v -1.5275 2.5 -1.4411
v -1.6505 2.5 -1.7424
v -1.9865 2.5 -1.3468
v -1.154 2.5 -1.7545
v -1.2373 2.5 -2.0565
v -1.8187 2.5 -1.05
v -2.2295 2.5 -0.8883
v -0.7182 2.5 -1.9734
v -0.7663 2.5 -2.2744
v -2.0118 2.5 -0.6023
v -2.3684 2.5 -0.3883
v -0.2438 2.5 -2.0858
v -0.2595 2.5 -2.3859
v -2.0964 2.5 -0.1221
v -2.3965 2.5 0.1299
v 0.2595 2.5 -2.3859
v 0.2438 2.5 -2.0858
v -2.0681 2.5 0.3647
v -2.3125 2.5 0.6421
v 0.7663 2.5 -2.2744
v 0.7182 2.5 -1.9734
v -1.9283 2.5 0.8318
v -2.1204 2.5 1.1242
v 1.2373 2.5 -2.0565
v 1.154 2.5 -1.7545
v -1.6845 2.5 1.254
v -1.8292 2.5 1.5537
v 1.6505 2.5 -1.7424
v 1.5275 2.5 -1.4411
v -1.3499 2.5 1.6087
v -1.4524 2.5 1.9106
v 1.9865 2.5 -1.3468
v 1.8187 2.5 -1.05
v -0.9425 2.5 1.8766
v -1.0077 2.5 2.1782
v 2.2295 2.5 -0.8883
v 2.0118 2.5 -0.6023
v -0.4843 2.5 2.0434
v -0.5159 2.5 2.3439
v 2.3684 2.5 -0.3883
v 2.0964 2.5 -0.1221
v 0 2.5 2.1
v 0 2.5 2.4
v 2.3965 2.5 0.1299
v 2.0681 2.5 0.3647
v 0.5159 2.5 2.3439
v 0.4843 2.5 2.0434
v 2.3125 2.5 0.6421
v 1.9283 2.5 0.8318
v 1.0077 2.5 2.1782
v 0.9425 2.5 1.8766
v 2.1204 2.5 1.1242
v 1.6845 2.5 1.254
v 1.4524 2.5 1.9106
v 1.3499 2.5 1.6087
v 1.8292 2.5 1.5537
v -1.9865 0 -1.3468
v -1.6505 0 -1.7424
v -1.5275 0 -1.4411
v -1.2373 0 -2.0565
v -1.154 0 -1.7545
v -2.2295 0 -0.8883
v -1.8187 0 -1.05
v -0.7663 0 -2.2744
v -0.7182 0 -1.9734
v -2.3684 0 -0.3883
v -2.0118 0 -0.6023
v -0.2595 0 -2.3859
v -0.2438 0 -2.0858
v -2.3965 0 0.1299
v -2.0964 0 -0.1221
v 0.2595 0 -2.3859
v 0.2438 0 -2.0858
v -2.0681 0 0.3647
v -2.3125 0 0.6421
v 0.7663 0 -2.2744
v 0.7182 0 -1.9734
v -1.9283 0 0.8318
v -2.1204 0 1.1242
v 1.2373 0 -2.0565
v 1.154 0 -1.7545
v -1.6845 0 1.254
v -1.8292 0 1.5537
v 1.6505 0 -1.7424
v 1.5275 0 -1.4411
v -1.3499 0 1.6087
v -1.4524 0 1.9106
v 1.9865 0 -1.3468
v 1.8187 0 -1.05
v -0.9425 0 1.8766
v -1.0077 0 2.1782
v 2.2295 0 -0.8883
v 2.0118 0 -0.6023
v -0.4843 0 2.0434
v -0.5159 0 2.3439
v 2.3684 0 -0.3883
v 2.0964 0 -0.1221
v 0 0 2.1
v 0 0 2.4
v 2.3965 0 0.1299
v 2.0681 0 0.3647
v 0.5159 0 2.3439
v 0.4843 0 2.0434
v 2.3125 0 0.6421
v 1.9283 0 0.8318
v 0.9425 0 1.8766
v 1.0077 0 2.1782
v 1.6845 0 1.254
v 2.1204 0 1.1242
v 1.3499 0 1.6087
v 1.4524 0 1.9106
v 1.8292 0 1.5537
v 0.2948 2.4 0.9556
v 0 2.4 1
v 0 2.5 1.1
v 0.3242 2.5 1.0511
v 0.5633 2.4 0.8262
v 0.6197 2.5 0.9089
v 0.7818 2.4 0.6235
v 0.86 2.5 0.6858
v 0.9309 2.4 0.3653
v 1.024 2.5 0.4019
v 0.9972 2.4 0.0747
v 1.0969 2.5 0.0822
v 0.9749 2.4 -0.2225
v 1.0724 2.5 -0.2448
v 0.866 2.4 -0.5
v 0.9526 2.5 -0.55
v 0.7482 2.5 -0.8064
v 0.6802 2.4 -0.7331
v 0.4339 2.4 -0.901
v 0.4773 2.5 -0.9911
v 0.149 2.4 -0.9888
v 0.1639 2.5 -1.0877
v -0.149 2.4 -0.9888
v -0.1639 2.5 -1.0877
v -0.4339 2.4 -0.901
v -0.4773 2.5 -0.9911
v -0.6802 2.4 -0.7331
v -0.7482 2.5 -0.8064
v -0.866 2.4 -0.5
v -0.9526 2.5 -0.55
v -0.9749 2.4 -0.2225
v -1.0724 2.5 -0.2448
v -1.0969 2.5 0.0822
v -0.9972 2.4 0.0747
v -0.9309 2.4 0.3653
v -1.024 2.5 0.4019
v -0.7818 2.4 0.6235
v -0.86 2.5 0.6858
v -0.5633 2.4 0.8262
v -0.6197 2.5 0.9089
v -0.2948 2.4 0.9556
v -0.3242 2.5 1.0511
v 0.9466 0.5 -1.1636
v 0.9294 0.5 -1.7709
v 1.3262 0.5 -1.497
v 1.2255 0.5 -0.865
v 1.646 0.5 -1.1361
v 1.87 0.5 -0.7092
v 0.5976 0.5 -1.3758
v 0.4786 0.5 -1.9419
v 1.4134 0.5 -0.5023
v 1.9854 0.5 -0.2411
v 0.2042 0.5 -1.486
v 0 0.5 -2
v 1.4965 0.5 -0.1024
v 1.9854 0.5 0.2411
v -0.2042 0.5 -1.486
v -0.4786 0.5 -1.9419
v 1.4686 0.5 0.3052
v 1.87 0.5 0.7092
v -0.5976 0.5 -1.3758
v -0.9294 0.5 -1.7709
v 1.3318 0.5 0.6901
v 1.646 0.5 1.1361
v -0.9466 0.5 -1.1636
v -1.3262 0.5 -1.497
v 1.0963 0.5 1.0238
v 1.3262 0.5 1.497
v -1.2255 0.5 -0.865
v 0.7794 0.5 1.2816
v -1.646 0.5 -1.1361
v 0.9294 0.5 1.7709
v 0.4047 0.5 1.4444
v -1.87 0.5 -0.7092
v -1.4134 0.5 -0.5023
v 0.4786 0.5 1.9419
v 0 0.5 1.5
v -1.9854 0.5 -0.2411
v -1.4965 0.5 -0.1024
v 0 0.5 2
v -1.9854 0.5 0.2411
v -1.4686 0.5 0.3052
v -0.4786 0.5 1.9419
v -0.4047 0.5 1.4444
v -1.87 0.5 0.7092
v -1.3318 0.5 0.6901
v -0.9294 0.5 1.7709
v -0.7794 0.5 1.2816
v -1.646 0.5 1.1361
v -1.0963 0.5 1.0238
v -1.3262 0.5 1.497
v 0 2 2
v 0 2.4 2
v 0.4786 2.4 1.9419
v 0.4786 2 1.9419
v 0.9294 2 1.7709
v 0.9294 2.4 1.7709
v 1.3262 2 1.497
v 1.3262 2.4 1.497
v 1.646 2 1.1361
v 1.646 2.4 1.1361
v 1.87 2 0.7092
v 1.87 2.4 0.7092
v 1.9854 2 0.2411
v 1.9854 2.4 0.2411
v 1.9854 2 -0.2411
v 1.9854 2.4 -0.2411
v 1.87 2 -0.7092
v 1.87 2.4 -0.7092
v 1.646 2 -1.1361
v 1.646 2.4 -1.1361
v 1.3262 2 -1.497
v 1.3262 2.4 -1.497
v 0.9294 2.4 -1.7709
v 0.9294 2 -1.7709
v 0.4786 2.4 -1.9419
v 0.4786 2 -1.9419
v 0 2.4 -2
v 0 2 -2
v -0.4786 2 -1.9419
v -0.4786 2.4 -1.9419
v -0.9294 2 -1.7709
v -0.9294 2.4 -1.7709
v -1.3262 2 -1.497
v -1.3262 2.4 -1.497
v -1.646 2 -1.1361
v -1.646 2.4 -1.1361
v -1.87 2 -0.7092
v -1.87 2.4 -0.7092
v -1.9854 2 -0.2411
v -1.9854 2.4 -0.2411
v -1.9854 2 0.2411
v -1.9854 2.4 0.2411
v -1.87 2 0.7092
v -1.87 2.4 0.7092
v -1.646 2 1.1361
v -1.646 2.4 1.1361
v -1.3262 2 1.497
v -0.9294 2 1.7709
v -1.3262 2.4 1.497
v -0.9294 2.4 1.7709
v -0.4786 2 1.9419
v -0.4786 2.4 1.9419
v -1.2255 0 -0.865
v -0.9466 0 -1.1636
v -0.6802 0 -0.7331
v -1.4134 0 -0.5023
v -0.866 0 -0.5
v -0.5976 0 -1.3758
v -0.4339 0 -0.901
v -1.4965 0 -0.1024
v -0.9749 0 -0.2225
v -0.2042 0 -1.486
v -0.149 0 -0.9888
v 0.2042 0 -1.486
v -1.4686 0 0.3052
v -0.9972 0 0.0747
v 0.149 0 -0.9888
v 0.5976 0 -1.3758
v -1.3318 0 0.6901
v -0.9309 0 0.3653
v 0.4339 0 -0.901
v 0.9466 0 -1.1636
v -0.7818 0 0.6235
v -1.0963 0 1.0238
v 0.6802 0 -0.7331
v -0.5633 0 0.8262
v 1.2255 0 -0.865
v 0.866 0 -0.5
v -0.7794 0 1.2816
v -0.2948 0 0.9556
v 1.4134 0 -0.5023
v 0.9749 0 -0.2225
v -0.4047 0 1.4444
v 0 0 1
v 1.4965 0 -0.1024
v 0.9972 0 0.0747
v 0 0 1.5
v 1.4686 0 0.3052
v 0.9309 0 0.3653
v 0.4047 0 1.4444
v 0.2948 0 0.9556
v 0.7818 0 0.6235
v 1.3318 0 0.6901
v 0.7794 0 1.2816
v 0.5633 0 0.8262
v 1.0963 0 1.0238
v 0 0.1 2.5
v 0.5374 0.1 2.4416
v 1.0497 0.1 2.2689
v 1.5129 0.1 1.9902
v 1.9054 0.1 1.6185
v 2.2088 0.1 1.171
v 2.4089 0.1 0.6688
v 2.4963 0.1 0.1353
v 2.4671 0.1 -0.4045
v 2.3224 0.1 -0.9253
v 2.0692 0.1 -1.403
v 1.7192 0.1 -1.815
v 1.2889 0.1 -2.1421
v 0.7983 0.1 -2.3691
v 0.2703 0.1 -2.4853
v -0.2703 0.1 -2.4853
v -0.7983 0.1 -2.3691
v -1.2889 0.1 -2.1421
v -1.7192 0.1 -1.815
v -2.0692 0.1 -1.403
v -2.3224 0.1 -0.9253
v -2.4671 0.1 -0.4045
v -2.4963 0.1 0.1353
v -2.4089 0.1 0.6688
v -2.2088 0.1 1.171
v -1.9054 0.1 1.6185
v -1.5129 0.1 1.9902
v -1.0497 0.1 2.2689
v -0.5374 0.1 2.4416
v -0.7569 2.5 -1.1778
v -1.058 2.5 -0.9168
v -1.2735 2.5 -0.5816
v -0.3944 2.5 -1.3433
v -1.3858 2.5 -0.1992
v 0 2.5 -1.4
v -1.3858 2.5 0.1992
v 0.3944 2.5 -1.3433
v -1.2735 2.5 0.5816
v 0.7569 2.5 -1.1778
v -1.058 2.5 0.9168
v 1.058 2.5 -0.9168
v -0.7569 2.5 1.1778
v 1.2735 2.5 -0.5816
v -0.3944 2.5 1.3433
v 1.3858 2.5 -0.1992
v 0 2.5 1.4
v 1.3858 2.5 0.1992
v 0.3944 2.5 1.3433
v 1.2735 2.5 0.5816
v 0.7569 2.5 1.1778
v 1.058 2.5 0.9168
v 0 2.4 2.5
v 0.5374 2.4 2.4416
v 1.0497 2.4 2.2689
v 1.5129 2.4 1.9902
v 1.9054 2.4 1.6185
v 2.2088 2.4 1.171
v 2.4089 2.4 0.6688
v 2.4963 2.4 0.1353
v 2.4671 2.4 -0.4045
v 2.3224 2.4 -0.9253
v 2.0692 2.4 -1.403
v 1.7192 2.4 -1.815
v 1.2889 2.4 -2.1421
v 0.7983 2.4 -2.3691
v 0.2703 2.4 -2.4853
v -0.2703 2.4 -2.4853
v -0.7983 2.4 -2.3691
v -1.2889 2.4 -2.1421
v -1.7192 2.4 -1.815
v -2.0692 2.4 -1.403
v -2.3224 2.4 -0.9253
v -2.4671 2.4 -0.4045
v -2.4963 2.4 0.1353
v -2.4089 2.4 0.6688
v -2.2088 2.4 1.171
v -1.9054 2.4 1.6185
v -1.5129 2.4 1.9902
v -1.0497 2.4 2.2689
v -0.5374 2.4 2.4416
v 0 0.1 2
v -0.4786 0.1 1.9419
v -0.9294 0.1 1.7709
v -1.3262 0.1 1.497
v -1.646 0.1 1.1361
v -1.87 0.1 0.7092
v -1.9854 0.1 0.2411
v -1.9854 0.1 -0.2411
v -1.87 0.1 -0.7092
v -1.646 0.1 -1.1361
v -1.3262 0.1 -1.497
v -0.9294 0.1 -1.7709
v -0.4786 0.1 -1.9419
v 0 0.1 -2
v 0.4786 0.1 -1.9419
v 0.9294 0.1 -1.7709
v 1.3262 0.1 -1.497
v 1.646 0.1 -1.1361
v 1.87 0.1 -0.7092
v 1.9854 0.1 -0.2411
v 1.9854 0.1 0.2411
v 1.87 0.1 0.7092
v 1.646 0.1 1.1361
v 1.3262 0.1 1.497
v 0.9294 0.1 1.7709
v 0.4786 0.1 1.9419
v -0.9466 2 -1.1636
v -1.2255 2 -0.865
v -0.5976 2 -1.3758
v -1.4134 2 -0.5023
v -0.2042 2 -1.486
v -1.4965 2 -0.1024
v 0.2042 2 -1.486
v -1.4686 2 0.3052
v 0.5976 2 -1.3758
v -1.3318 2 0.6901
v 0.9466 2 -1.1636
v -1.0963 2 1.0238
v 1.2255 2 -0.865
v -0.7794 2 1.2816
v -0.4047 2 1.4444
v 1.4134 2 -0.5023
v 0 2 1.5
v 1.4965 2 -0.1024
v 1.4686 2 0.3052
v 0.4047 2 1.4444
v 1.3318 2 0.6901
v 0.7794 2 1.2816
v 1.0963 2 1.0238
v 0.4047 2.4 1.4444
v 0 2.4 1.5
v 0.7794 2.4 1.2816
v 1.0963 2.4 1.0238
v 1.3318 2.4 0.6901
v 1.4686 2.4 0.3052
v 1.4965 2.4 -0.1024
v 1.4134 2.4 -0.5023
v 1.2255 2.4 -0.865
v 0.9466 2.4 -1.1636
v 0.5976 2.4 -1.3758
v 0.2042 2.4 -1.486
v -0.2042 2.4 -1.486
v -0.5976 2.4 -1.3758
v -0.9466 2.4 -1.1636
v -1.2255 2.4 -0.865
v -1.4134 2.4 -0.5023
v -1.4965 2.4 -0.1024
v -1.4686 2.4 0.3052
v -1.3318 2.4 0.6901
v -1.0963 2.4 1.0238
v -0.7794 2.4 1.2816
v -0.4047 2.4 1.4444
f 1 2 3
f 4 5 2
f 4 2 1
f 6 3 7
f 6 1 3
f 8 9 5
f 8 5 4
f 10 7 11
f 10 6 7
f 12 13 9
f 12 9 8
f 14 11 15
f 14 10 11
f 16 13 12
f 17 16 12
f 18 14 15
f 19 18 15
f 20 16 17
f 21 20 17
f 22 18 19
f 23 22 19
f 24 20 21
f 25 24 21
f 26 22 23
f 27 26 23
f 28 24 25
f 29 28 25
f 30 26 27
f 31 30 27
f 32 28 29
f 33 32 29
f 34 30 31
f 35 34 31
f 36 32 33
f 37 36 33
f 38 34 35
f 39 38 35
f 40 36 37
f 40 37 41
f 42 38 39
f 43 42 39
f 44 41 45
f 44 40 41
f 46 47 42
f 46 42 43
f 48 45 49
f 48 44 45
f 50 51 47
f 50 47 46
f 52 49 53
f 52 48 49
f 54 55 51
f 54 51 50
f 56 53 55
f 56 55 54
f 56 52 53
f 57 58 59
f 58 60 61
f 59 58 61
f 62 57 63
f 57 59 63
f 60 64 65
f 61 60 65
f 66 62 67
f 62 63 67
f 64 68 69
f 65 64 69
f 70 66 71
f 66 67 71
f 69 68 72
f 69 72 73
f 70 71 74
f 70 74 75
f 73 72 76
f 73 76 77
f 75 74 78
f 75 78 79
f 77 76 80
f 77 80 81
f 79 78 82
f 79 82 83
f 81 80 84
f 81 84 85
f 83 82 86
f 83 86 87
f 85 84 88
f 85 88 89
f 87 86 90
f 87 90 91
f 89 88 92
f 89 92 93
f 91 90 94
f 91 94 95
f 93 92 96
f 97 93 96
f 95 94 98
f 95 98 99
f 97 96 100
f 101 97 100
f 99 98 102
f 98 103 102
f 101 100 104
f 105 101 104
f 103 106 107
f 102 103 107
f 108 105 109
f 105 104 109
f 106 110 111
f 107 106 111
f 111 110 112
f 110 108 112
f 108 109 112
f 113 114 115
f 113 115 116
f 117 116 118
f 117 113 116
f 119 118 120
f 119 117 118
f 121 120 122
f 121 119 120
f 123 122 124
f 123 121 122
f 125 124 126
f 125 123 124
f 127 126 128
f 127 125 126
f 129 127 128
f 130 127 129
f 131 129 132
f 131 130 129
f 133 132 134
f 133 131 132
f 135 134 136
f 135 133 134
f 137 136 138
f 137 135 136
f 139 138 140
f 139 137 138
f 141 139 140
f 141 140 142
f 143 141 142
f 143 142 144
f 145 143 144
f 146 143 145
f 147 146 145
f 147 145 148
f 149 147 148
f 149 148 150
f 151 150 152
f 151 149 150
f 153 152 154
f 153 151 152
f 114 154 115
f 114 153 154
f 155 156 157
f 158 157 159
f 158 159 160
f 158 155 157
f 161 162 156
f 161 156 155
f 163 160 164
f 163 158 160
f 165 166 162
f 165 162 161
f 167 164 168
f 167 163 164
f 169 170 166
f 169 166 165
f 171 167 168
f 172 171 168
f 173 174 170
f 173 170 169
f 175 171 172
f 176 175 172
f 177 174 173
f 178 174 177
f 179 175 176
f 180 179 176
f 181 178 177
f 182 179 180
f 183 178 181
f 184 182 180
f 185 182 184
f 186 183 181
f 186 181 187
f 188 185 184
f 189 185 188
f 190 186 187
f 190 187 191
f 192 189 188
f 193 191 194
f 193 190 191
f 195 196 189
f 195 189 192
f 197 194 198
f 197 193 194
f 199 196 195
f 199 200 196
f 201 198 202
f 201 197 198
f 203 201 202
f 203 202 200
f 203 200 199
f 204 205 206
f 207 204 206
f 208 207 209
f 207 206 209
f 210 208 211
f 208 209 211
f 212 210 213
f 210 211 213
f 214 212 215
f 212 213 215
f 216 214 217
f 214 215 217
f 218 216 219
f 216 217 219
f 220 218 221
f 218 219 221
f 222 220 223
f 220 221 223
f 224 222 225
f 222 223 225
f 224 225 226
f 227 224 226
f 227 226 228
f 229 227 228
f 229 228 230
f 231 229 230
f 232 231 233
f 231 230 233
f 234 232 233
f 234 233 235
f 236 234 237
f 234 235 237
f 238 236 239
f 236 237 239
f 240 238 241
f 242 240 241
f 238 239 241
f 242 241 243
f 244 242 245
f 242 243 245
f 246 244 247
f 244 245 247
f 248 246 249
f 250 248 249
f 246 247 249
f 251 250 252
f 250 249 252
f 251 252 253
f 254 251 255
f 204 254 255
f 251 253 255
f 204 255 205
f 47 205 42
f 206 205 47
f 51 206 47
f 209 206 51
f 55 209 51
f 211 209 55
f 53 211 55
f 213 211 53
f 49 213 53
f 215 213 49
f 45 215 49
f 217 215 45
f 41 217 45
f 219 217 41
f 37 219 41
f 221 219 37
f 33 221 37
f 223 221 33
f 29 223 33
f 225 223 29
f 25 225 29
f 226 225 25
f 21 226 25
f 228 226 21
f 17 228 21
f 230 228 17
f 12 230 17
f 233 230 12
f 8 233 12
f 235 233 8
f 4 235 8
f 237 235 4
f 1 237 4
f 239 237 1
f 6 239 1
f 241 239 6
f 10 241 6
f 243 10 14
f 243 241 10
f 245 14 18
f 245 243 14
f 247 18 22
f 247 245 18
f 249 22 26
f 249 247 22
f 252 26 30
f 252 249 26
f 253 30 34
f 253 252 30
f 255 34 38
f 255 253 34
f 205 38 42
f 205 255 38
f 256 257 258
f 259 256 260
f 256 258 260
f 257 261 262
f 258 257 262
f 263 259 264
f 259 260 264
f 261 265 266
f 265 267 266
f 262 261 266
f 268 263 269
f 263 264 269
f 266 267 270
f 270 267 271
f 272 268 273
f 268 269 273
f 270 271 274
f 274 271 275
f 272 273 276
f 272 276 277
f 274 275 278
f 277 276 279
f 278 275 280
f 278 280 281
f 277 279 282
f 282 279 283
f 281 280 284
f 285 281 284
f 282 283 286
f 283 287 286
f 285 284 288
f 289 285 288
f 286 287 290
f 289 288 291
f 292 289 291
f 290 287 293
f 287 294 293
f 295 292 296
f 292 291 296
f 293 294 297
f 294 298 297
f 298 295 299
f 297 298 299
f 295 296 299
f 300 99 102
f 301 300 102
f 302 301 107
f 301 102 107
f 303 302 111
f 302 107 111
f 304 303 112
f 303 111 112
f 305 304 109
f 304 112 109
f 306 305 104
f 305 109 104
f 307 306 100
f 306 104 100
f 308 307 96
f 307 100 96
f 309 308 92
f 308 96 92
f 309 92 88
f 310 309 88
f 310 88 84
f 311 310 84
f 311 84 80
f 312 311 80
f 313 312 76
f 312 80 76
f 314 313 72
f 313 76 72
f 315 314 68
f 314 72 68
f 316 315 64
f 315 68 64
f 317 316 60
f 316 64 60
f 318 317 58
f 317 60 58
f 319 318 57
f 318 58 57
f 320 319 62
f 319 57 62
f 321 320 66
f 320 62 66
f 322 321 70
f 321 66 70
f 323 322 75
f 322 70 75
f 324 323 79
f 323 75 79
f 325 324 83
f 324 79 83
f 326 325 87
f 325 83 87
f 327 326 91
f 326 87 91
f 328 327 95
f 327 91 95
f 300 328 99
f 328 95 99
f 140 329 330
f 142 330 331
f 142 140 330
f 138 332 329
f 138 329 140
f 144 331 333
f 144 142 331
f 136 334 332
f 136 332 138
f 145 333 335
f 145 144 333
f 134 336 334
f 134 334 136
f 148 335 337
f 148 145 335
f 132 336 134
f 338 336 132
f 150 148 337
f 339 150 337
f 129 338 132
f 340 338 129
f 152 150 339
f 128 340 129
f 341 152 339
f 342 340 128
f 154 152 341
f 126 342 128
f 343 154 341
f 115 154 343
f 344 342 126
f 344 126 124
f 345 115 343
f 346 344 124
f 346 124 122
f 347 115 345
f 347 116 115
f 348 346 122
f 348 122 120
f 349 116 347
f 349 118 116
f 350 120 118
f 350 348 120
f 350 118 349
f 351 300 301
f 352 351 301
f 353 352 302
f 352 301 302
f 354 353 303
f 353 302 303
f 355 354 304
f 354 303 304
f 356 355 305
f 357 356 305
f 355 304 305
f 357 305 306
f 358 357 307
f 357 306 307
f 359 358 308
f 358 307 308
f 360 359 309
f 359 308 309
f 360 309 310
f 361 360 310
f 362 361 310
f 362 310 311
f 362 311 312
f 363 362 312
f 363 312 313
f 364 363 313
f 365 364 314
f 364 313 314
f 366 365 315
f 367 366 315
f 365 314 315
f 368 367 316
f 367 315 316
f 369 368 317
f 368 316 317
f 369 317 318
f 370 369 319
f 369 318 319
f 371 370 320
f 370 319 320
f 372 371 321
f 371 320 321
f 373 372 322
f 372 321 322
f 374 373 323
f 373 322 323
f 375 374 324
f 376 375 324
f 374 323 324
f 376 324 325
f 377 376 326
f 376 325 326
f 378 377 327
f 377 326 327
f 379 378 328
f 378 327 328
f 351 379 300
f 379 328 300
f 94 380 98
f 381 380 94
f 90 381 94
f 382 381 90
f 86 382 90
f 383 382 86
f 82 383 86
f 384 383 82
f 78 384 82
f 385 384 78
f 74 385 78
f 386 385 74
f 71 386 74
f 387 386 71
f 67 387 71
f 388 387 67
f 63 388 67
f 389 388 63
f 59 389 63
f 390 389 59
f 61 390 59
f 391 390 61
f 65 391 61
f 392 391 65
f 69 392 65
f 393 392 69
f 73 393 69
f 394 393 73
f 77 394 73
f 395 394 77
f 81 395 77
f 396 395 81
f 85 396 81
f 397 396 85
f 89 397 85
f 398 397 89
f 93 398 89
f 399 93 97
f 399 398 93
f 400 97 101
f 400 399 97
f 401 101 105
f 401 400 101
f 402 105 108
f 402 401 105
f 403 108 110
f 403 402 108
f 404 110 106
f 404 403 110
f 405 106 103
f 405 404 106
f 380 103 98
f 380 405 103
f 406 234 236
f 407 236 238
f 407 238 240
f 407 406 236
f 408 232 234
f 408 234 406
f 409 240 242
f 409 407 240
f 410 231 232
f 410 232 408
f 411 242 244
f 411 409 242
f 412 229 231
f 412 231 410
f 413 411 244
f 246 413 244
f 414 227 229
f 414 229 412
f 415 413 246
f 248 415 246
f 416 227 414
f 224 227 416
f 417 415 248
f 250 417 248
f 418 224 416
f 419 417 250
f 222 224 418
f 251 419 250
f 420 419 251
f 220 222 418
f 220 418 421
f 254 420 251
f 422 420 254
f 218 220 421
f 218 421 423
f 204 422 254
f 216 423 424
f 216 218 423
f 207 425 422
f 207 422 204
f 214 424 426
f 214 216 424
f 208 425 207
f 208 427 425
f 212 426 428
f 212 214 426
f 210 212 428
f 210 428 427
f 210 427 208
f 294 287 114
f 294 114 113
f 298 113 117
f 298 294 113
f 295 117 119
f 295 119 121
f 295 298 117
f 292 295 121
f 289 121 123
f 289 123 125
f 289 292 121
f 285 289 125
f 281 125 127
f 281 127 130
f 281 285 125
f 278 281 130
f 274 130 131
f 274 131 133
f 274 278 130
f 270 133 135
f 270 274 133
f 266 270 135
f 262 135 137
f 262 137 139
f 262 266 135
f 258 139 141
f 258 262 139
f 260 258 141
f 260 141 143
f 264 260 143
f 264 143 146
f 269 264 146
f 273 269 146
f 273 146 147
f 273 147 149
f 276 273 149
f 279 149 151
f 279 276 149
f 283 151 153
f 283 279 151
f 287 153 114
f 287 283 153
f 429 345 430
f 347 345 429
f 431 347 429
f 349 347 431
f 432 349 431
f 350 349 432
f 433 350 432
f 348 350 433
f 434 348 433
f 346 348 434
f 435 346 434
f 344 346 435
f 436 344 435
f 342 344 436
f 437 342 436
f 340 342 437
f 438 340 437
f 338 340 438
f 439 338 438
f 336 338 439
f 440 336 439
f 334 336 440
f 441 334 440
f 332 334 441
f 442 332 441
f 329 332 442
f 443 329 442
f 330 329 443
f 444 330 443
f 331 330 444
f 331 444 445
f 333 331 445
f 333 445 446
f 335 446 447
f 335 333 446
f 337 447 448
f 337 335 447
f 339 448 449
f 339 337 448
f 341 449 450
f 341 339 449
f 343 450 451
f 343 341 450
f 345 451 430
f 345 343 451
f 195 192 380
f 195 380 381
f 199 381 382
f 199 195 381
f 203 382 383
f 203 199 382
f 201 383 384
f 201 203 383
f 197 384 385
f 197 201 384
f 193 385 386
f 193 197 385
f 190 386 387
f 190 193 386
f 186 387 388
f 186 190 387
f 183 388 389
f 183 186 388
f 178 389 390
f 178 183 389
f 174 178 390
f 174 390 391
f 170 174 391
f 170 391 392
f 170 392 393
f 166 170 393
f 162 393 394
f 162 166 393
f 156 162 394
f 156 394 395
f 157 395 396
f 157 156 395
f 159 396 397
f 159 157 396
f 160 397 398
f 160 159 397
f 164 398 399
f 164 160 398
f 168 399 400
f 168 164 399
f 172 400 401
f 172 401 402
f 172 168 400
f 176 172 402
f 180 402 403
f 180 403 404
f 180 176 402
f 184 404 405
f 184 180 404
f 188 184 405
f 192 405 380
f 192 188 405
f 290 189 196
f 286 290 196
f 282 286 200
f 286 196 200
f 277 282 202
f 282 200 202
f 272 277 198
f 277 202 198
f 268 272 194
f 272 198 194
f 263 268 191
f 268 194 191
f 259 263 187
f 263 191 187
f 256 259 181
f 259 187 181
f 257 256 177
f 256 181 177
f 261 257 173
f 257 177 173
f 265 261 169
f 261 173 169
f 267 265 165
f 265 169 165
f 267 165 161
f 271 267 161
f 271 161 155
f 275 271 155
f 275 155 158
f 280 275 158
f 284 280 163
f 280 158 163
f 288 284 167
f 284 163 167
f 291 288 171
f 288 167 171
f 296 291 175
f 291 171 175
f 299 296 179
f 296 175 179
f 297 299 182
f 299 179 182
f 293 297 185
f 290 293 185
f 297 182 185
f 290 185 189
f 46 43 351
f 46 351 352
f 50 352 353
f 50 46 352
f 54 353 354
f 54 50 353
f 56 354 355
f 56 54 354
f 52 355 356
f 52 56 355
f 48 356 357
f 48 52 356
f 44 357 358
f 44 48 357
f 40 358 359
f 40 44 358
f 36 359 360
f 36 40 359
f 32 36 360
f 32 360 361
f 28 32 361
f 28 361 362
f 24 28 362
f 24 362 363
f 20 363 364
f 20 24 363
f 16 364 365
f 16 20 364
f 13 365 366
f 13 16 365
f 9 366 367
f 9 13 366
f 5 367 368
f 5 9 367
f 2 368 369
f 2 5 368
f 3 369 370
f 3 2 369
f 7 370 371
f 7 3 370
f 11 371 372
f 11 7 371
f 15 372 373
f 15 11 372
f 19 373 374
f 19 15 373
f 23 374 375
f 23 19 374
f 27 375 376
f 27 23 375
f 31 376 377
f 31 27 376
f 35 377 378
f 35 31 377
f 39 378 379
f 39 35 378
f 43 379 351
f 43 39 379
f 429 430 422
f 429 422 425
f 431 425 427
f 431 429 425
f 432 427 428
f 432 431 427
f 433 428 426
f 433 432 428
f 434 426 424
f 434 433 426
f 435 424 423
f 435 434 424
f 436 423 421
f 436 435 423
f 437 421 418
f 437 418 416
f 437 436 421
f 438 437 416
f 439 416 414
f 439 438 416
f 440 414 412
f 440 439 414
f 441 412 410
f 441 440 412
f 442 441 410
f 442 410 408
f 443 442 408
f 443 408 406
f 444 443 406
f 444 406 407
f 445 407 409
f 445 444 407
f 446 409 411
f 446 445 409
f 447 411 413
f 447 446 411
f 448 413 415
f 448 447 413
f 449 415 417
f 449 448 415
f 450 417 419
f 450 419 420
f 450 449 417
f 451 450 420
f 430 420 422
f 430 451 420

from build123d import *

# Parameters (mm, degrees)
SKETCH1_R           = 2.5
SKETCH1_R_2         = 1
BOSS_EXTRUDE1_DEPTH = 2.5
SKETCH2_R           = 2
SKETCH2_R_2         = 1.5
CUT_EXTRUDE1_DEPTH  = 0.5
CUT_EXTRUDE2_START  = -0.5
SKETCH3_R           = 2
SKETCH3_R_2         = 1.5
CUT_EXTRUDE2_DEPTH  = 0.5
CHAMFER1_SIZE       = 0.1


with BuildPart() as part:
    # Sketch1 → Boss-Extrude1 (new body)
    with BuildSketch(Plane(origin=(0, 0, 0), x_dir=(1, 0, 0), z_dir=(0, 1, 0))):
        with Locations(Location((0, 0, 0), (0, 0, 270))):
            Circle(SKETCH1_R)
        with Locations(Location((0, 0, 0), (0, 0, 270))):
            Circle(SKETCH1_R_2, mode=Mode.SUBTRACT)
    extrude(amount=BOSS_EXTRUDE1_DEPTH)

    # Sketch2 → Cut-Extrude1 (cut)
    with BuildSketch(Plane(origin=(0, 2.5, 0), x_dir=(1, 0, 0), z_dir=(0, 1, 0))):
        with Locations(Location((0, 0, 0), (0, 0, 270))):
            Circle(SKETCH2_R)
        with Locations(Location((0, 0, 0), (0, 0, 270))):
            Circle(SKETCH2_R_2, mode=Mode.SUBTRACT)
    extrude(amount=-CUT_EXTRUDE1_DEPTH, mode=Mode.SUBTRACT)

    # Sketch3 → Cut-Extrude2 (cut)
    with BuildSketch(Plane.XZ.offset(CUT_EXTRUDE2_START)):
        with Locations(Location((0, 0, 0), (0, 0, 90))):
            Circle(SKETCH3_R)
        with Locations(Location((0, 0, 0), (0, 0, 90))):
            Circle(SKETCH3_R_2, mode=Mode.SUBTRACT)
    extrude(amount=CUT_EXTRUDE2_DEPTH, mode=Mode.SUBTRACT)

    # Chamfer1
    chamfer1_edges = [part.edges().sort_by_distance(p)[0] for p in [
        (0, 2.5, -2),
        (0, 2.5, -1.5),
        (0, 0, -2),
        (0, 0, -2.5),
        (0, 2.5, -2.5),
        (0, 2.5, -1),
    ]]
    chamfer(chamfer1_edges, length=CHAMFER1_SIZE)


solid = part.part
